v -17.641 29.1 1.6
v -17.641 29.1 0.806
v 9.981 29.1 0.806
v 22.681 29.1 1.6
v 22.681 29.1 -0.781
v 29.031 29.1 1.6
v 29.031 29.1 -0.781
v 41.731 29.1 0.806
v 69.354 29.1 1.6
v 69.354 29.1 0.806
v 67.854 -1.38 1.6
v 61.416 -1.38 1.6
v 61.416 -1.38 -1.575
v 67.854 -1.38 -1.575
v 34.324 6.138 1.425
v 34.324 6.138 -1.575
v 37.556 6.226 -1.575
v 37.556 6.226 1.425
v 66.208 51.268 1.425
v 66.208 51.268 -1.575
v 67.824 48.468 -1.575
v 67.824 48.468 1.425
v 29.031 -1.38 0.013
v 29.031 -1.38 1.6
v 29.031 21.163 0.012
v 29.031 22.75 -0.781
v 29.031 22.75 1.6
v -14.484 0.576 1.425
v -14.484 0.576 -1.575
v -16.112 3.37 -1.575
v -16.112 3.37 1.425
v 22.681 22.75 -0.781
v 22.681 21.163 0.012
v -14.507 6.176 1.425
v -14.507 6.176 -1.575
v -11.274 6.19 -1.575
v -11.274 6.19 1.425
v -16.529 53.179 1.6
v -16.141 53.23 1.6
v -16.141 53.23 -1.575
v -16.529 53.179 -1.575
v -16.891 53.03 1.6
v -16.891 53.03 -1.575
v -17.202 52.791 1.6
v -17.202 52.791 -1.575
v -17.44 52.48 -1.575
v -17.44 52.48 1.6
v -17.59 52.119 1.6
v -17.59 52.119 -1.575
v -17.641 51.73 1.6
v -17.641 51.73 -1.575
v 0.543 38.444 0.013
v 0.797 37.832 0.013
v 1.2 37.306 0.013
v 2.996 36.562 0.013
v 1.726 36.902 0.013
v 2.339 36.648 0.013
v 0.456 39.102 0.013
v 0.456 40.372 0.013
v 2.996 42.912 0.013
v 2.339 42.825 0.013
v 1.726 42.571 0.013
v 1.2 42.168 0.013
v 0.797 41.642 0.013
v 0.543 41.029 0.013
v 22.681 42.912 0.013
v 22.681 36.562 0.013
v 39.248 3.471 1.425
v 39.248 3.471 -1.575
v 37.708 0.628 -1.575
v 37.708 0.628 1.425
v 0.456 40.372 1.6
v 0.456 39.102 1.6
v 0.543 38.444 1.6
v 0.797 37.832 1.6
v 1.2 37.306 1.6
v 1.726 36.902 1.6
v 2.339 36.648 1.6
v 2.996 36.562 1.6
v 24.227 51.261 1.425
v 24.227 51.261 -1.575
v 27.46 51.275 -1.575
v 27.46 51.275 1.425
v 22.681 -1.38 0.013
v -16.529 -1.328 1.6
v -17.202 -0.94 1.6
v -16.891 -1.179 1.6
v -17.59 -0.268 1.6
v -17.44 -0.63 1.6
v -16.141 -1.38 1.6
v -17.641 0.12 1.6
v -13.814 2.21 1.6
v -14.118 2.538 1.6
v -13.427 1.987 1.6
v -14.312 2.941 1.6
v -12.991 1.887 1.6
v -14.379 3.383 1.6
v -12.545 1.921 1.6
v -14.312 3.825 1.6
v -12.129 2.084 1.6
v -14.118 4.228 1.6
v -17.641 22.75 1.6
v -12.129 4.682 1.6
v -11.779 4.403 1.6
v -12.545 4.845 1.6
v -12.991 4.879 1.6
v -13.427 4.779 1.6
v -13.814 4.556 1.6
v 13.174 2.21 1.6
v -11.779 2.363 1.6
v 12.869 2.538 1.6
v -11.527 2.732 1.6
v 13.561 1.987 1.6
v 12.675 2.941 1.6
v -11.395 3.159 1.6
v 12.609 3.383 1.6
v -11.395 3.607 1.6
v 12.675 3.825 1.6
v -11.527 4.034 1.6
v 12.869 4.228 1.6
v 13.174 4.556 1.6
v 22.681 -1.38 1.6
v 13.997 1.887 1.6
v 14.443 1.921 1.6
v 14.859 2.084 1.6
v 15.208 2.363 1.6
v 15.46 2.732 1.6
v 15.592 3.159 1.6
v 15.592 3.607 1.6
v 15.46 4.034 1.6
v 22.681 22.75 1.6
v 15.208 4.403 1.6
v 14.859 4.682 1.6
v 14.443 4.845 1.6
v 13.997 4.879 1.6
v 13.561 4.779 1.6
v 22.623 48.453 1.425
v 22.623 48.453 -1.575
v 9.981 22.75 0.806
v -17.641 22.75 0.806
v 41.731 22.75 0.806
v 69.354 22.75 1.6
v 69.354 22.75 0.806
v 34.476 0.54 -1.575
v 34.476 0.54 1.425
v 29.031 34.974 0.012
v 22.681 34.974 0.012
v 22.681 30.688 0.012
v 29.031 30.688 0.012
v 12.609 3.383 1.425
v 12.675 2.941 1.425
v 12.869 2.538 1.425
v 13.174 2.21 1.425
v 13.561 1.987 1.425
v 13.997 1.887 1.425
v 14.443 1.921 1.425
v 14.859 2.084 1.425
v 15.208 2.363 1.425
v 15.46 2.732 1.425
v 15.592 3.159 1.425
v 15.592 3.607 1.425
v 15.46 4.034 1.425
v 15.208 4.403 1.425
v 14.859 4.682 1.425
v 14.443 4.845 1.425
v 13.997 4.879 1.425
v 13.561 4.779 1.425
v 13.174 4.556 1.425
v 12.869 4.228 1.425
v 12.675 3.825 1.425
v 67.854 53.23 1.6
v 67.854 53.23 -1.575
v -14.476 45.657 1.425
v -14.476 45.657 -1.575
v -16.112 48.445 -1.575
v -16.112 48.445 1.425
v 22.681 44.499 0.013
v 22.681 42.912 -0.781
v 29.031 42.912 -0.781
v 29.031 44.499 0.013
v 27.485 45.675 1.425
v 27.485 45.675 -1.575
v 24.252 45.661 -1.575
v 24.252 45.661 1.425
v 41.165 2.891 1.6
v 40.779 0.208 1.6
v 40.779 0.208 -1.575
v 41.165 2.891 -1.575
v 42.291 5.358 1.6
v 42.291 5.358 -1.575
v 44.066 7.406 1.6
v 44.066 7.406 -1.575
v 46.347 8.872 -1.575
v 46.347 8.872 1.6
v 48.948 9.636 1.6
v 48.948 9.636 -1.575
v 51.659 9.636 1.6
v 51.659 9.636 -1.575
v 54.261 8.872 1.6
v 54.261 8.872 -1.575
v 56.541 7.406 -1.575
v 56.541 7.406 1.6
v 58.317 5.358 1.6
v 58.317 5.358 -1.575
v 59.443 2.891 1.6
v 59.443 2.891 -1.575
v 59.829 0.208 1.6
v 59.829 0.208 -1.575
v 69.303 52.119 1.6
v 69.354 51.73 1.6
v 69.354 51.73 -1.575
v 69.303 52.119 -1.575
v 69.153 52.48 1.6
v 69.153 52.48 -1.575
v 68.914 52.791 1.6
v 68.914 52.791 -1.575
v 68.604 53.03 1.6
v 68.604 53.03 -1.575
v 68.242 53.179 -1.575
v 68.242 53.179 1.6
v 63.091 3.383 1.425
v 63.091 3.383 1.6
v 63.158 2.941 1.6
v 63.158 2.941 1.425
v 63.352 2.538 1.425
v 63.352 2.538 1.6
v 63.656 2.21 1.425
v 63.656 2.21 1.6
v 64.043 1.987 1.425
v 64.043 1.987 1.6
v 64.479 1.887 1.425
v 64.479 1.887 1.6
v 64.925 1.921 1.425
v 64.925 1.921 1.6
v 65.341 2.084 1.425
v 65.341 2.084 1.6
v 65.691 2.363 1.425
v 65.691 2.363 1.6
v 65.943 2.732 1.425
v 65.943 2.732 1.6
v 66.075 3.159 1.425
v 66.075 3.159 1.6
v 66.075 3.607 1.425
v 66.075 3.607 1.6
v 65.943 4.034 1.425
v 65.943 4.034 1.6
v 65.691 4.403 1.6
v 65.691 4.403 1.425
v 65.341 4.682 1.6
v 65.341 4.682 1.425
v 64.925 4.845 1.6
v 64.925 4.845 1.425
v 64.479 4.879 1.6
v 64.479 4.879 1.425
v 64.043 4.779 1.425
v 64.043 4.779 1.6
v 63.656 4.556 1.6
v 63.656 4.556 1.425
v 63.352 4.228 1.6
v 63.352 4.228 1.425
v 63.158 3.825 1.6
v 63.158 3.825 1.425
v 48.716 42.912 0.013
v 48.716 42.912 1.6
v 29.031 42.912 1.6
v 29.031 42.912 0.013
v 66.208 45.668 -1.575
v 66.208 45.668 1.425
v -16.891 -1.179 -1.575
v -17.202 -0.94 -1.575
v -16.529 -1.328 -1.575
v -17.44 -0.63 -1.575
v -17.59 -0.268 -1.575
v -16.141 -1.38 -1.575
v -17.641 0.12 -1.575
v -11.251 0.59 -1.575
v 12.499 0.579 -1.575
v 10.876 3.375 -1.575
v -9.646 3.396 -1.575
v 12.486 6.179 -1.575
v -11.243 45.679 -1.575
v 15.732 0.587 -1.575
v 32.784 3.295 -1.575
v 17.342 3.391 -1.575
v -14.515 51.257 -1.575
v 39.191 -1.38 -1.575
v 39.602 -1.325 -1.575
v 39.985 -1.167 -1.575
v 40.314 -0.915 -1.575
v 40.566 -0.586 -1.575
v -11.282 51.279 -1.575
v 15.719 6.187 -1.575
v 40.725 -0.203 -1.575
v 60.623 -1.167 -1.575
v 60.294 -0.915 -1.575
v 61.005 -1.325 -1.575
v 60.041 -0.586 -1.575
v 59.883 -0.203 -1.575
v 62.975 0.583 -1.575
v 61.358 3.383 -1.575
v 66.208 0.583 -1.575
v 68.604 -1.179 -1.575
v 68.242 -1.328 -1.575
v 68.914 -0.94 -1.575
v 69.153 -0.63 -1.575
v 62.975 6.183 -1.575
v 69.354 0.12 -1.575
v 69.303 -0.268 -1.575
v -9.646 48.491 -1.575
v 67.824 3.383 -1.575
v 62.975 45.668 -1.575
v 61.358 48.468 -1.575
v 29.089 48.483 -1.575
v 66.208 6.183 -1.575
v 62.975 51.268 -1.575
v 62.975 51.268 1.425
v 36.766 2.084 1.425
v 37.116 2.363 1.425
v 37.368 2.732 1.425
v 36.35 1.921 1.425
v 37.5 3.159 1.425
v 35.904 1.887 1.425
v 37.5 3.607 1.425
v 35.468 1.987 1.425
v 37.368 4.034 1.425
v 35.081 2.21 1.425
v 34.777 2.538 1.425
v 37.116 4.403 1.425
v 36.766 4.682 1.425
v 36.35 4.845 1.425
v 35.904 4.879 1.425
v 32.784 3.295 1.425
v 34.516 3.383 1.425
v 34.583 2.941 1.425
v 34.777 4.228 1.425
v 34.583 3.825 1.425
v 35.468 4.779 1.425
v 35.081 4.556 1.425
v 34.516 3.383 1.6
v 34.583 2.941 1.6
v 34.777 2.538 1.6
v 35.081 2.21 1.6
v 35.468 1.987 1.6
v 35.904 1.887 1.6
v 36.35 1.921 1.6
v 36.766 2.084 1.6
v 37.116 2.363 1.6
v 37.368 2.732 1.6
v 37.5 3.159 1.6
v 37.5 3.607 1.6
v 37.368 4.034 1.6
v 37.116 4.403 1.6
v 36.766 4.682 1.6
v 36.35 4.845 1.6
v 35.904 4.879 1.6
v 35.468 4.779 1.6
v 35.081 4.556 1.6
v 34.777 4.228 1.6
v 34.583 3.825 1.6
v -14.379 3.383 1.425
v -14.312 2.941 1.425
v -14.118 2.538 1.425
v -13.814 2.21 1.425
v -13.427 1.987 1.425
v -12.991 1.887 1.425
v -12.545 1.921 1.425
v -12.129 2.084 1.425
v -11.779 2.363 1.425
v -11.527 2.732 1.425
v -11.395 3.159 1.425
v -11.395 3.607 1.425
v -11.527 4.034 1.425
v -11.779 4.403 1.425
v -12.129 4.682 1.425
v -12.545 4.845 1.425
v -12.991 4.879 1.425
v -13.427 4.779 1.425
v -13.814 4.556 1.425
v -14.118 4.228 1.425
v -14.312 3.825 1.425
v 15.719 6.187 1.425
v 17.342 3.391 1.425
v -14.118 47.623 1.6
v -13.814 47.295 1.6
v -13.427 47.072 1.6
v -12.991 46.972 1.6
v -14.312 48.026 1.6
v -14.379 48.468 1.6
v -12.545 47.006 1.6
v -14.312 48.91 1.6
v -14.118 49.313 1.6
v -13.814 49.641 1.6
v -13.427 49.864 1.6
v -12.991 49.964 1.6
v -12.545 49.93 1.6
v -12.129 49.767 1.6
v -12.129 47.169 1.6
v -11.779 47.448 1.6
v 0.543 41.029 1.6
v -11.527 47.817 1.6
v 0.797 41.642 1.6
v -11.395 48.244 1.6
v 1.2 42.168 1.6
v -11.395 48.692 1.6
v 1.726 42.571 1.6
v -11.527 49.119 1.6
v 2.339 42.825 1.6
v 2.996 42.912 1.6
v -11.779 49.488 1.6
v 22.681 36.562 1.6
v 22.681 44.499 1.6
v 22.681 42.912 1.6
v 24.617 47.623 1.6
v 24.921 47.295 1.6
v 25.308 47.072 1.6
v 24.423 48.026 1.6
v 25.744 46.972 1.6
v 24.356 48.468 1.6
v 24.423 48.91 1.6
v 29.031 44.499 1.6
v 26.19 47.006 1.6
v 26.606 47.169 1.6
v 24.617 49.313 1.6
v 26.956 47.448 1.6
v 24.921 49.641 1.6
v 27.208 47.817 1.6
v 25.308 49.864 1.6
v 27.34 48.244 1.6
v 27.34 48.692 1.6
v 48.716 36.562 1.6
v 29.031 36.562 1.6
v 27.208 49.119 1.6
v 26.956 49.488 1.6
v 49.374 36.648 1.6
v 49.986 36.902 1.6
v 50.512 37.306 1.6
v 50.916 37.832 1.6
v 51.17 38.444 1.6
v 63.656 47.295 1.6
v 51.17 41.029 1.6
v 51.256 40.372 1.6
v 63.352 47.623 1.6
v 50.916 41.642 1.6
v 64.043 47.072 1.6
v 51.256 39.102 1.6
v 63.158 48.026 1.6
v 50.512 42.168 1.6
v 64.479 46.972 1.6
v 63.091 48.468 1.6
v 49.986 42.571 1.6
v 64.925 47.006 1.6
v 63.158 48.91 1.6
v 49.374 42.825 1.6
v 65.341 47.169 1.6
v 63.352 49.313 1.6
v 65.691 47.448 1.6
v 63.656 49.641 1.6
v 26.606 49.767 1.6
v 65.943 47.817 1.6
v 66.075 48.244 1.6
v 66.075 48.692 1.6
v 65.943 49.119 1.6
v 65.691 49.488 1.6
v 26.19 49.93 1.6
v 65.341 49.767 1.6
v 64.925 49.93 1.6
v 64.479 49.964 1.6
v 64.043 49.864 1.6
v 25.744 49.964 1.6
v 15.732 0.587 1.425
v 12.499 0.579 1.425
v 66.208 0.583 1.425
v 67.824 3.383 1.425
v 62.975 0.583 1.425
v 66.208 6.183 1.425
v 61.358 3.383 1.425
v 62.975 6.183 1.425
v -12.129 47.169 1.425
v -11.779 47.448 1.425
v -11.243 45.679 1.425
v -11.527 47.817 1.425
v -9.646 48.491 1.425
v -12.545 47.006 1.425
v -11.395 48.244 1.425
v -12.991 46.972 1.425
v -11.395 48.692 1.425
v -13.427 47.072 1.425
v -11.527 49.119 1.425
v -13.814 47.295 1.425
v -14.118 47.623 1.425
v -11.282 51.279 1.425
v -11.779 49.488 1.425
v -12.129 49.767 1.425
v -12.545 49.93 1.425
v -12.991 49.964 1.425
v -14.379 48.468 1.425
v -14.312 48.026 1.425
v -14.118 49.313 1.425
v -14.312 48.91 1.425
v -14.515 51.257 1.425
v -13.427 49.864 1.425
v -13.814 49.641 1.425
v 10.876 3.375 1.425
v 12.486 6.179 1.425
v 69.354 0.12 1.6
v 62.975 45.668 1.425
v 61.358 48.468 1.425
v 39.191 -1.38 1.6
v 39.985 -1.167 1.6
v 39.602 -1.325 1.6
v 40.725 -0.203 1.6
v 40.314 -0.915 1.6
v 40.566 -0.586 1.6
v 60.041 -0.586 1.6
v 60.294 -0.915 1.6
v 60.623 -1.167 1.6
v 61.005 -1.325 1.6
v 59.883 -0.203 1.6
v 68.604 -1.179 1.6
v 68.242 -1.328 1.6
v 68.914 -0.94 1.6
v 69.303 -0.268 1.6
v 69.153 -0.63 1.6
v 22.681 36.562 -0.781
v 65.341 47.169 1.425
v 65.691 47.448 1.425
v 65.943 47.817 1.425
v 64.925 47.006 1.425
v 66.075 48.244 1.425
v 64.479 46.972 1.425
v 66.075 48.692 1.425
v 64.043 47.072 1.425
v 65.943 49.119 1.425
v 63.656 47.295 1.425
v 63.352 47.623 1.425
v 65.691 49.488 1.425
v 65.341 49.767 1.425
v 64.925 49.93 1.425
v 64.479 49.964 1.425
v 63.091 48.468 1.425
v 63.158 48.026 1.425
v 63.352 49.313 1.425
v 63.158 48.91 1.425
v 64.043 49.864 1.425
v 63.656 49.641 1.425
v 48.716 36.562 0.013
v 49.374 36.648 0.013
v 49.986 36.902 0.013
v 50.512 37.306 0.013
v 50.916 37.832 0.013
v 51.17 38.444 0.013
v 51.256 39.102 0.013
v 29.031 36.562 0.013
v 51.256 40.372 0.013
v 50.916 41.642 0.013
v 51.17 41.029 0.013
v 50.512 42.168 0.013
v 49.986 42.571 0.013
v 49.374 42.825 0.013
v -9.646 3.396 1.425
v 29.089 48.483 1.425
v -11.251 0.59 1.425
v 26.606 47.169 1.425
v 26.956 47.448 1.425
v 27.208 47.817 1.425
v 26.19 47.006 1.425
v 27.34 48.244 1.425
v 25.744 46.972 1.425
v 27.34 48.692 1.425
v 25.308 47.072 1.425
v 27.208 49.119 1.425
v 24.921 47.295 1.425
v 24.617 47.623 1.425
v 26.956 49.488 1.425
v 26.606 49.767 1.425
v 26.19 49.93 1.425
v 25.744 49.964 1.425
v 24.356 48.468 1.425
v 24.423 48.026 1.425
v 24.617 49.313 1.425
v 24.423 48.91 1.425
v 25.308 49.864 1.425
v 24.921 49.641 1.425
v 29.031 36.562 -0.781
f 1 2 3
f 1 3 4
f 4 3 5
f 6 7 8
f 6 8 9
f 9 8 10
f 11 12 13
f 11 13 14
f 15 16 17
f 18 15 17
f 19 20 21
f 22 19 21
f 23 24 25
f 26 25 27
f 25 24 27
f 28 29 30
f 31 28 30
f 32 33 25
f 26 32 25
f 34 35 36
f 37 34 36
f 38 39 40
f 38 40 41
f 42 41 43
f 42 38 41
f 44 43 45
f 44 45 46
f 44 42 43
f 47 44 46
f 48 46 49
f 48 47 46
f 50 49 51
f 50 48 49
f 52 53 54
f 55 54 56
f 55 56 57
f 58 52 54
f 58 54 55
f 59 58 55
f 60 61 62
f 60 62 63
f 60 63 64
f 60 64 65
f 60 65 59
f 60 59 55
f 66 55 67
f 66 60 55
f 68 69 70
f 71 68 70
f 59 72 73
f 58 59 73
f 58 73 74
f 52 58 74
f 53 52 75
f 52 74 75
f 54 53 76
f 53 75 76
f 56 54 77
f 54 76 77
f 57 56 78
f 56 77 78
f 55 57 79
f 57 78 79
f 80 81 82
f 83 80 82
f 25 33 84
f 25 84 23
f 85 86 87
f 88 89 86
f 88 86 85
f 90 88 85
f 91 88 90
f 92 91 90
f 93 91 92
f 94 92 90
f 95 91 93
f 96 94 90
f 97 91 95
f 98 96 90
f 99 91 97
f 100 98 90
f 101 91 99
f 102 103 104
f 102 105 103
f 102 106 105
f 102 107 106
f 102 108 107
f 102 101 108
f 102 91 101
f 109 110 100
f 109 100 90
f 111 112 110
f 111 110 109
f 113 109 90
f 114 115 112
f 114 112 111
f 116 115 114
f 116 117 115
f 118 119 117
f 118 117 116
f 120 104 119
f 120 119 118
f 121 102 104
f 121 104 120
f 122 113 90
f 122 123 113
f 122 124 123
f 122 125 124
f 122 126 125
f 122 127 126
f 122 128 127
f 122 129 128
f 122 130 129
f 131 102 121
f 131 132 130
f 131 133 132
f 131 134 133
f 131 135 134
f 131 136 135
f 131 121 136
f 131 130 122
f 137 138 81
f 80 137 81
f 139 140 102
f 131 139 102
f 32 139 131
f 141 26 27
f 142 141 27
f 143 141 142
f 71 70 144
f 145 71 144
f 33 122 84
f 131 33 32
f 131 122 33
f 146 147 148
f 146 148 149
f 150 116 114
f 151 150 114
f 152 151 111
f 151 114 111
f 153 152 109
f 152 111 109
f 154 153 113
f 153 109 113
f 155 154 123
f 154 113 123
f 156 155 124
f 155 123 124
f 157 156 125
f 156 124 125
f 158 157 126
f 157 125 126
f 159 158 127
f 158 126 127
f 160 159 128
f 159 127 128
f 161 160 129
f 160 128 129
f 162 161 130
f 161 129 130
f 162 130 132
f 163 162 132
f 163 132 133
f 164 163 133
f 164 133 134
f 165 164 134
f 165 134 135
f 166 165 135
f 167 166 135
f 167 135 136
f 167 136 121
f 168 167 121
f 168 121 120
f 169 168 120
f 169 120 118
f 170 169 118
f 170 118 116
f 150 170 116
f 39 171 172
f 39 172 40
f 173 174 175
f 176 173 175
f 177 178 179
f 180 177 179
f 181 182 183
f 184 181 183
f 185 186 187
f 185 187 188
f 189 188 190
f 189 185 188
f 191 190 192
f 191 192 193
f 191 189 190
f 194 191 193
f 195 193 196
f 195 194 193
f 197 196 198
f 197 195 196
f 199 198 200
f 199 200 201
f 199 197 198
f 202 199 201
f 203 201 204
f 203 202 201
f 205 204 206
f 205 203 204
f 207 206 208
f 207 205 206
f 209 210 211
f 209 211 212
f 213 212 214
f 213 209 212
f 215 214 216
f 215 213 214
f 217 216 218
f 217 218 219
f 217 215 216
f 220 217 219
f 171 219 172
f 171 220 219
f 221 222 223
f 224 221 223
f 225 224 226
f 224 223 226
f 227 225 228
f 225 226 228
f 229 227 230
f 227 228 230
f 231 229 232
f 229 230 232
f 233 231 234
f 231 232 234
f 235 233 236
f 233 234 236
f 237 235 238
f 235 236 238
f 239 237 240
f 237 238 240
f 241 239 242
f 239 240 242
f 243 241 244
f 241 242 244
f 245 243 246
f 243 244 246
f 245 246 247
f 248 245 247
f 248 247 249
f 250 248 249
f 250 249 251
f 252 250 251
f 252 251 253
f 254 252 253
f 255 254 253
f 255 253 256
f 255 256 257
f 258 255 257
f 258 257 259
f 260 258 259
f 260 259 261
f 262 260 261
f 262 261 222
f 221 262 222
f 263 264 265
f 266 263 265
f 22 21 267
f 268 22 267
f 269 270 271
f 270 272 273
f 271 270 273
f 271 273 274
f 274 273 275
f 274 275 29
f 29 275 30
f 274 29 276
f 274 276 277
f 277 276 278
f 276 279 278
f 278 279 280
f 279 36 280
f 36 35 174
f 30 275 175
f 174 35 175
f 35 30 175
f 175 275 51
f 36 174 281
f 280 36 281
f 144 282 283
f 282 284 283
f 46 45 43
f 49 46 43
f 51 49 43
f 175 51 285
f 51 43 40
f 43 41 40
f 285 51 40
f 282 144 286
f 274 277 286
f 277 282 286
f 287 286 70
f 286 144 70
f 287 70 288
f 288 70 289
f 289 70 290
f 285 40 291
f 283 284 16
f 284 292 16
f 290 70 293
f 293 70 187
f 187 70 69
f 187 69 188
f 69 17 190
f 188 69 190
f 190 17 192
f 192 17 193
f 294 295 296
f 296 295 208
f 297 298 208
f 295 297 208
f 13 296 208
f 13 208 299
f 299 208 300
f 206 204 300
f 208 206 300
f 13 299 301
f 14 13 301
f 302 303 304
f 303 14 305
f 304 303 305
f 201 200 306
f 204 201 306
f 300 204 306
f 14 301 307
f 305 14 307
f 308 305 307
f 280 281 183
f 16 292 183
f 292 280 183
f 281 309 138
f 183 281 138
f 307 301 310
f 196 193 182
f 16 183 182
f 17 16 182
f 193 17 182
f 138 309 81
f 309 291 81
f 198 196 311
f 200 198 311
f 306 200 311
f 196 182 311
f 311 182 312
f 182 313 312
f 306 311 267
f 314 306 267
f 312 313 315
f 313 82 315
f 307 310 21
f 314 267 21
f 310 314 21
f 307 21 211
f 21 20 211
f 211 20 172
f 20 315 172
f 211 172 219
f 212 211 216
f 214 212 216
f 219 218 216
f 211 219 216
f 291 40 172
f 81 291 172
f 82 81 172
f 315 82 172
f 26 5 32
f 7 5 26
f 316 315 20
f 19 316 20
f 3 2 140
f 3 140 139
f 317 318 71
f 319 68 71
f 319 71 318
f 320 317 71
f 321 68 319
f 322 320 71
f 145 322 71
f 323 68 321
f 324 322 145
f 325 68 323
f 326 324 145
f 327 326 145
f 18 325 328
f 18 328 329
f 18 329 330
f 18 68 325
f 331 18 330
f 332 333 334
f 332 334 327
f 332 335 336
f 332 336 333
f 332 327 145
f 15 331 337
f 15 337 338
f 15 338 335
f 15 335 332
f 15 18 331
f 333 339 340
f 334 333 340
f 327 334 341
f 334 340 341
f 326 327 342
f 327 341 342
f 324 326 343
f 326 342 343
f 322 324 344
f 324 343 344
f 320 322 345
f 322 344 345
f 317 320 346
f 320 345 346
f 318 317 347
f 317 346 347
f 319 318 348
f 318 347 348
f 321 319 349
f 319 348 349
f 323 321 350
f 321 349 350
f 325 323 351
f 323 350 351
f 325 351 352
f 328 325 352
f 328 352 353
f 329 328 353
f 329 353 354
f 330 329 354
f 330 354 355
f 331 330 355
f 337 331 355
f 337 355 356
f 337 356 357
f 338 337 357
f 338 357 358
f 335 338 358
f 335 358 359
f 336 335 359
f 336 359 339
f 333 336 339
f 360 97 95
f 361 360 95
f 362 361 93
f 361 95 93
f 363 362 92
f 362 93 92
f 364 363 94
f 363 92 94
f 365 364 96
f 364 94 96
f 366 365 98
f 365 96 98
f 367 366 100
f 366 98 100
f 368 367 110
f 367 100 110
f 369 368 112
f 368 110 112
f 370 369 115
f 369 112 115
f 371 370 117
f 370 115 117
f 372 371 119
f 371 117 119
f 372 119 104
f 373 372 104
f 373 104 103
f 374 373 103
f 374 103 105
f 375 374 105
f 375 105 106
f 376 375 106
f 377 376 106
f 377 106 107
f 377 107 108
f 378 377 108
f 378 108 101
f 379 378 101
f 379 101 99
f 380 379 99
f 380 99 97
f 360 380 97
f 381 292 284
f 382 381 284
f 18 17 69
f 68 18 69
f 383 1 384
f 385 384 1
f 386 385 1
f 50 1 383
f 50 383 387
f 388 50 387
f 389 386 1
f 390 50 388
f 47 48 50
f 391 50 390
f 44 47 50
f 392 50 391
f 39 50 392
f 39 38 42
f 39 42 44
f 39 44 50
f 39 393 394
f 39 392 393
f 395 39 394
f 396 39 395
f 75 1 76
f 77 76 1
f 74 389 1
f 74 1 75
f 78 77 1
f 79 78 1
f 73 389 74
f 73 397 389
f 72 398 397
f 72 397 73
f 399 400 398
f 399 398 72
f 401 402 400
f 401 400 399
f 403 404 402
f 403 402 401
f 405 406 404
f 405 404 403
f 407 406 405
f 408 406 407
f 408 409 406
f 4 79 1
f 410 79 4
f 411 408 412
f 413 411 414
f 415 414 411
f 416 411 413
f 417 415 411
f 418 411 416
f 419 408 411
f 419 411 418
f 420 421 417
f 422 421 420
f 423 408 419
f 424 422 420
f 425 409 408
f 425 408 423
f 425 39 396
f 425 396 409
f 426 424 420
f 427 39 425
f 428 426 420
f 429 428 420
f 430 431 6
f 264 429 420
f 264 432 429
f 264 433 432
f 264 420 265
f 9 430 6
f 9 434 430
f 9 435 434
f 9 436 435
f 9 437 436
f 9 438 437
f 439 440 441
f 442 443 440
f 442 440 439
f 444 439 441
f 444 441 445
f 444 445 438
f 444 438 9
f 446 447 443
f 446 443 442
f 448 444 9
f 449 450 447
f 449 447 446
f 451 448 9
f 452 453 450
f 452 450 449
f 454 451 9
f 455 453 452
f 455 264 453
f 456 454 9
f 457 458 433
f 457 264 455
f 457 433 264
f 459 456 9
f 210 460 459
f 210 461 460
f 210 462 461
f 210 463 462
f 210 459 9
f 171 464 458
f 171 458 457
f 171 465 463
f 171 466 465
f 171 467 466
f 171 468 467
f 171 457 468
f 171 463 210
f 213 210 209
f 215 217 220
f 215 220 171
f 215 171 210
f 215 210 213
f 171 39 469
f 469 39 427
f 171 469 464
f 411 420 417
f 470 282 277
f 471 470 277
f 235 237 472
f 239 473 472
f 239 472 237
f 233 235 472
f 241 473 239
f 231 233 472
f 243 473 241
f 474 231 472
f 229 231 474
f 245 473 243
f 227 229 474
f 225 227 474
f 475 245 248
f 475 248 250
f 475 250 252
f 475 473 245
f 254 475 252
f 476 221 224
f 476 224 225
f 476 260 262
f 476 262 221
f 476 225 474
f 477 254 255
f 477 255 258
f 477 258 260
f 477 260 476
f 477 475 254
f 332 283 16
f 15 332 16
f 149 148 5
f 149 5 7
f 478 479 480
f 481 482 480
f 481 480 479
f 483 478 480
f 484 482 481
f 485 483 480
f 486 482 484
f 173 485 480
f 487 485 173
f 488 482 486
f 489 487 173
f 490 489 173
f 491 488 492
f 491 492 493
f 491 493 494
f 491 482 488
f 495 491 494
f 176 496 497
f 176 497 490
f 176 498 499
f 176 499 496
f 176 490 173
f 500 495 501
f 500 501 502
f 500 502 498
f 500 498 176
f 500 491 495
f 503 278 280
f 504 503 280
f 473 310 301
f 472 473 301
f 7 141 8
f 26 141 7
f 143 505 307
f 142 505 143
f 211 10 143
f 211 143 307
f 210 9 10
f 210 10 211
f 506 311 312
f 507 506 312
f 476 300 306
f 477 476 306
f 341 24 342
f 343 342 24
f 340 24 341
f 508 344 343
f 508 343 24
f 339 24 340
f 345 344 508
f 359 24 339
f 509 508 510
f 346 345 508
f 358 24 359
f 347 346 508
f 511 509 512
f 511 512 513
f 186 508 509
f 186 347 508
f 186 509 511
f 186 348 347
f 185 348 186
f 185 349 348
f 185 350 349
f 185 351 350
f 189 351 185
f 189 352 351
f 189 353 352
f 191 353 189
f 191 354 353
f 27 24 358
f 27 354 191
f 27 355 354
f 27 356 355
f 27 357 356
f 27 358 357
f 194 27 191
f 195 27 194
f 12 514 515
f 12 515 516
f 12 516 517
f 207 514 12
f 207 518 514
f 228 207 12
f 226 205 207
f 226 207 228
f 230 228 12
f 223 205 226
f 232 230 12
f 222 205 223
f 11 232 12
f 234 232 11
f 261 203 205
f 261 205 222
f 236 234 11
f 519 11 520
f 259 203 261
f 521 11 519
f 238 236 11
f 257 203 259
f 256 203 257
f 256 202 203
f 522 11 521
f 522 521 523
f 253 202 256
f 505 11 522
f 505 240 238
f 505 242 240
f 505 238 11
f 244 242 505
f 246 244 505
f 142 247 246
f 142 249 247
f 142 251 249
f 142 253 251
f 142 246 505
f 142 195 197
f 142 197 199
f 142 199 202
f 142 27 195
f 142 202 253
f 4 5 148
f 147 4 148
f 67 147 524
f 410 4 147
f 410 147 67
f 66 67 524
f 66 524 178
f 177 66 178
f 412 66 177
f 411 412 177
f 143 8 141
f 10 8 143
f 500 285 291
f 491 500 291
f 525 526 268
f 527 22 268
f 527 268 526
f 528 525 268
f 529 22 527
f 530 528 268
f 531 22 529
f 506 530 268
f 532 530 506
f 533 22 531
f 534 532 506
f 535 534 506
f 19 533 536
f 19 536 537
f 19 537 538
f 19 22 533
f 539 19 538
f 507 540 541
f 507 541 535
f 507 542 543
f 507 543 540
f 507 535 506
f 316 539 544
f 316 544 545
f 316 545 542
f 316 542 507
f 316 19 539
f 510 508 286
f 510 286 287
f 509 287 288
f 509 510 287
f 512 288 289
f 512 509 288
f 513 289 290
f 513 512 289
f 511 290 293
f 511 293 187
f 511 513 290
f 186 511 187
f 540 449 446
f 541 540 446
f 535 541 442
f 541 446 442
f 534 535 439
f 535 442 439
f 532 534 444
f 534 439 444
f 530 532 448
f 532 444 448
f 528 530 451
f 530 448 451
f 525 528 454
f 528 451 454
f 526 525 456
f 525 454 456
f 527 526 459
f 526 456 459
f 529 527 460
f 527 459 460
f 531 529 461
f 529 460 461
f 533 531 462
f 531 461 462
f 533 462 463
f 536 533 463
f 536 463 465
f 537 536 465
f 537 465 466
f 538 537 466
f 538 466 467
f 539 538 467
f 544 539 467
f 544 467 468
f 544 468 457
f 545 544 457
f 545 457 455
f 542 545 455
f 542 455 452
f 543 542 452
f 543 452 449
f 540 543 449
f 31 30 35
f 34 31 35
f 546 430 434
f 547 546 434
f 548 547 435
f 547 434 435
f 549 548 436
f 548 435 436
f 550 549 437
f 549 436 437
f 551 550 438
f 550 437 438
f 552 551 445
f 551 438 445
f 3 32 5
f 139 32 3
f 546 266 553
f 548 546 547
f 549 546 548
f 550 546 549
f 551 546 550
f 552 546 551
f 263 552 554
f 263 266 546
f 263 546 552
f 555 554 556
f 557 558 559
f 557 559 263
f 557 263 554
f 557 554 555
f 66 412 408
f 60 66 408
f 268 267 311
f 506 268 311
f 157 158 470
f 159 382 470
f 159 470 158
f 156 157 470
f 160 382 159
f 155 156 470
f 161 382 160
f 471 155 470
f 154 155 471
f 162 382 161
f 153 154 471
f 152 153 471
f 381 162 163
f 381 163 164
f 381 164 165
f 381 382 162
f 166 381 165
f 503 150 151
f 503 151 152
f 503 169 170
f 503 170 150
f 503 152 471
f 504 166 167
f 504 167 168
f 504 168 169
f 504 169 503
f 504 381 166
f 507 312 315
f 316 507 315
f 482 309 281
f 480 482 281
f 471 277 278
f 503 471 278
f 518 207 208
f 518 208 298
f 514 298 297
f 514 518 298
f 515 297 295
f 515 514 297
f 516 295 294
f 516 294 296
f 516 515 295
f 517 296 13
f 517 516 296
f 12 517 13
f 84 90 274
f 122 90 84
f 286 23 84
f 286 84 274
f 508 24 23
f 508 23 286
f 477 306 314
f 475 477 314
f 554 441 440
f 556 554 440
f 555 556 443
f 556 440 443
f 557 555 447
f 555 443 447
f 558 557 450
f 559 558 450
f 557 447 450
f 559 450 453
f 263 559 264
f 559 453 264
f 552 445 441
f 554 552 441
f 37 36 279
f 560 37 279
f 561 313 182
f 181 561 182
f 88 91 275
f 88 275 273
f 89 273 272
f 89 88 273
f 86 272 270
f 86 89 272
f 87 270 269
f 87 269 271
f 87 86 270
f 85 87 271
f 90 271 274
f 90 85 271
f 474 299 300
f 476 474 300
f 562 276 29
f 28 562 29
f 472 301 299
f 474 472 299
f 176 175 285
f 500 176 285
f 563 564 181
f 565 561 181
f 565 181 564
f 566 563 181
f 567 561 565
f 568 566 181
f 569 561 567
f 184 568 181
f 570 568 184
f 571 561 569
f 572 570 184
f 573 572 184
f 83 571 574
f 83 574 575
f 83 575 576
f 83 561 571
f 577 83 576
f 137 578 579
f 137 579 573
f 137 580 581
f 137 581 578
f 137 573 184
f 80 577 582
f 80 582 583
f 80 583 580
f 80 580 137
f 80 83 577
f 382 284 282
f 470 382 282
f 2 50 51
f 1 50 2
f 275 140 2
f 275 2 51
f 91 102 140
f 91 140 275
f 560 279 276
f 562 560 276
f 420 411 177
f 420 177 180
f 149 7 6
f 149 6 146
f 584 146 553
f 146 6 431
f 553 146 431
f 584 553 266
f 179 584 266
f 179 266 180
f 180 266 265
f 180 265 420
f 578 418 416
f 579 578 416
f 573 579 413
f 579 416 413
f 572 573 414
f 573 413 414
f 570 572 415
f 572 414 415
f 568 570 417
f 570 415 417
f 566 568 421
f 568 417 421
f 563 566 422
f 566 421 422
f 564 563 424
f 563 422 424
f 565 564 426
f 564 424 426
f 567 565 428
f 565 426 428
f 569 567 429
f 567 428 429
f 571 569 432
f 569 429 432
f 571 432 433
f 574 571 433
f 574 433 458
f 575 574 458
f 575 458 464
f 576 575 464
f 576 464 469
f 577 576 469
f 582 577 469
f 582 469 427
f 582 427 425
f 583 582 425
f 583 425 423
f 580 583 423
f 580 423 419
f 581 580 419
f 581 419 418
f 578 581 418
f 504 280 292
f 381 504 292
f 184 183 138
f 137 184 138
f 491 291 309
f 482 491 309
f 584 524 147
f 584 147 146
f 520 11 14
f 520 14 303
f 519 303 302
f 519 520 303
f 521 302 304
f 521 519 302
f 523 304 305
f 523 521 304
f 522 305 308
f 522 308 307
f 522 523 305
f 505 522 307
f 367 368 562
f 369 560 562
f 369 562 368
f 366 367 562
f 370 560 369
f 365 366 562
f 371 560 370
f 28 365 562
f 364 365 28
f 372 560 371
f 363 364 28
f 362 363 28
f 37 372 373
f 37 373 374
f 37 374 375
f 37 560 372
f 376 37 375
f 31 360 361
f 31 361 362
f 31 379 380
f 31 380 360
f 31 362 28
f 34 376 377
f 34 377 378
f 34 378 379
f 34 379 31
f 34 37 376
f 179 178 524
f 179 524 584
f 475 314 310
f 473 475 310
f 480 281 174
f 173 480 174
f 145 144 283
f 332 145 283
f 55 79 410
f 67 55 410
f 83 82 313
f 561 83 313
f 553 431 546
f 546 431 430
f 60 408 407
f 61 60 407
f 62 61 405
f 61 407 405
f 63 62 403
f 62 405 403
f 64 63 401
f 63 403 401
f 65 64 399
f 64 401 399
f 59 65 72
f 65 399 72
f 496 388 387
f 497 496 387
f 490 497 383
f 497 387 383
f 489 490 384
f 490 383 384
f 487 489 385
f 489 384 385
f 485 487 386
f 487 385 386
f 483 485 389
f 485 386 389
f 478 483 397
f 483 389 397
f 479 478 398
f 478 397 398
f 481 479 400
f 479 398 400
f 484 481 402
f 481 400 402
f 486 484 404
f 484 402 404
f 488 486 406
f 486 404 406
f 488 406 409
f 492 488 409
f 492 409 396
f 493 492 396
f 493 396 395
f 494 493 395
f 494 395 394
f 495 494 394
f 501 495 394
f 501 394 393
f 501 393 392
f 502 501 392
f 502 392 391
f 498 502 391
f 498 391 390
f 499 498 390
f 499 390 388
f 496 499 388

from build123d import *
from OCP.BRepFilletAPI import BRepFilletAPI_MakeChamfer

# Parameters (mm, degrees)
SKETCH1_R           = 1.5
BOSS_EXTRUDE1_DEPTH = 3.175
SKETCH2_W           = 86.995
SKETCH2_H           = 6.35
CUT_EXTRUDE1_DEPTH  = 0.79375
SKETCH3_W           = 6.35
SKETCH3_H           = 30.48
CUT_EXTRUDE2_DEPTH  = 1.5875
SKETCH4_W           = 6.35
SKETCH4_H           = 15.39875
CUT_EXTRUDE3_DEPTH  = 1.5875
SKETCH6_W           = 6.35
SKETCH6_H           = 6.35
CUT_EXTRUDE4_DEPTH  = 0.79375
CHAMFER2_SIZE       = 1.5875
CHAMFER2_SIZE_2     = 0.79375
CUT_EXTRUDE5_DEPTH  = 1.5875
CUT_EXTRUDE6_DEPTH  = 3
SKETCH11_W          = 6.35
SKETCH11_H          = 6.35
CUT_EXTRUDE8_DEPTH  = 0.79375
CHAMFER3_START      = 22.750484618
CHAMFER3_DEPTH      = 6.35
CHAMFER4_SIZE       = 0.79375
CHAMFER4_SIZE_2     = 1.5875


with BuildPart() as part:
    # Sketch1 → Boss-Extrude1 (new body)
    with BuildSketch(Plane.XY.offset(1.6)):
        with BuildLine():
            Line((-17.641226071, 51.730484618), (-17.641226071, 0.120484618))
            ThreePointArc((-17.641226071, 0.120484618), (-17.201886242, -0.940175553), (-16.141226071, -1.379515382))
            Line((-16.141226071, -1.379515382), (39.191273929, -1.379515382))
            ThreePointArc((39.191273929, -1.379515382), (40.313805944, -0.914547397), (40.778773929, 0.207984618))
            ThreePointArc((40.778773929, 0.207984618), (50.303773929, 9.732984618), (59.828773929, 0.207984618))
            ThreePointArc((59.828773929, 0.207984618), (60.293741914, -0.914547397), (61.416273929, -1.379515382))
            Line((61.416273929, -1.379515382), (67.853773929, -1.379515382))
            ThreePointArc((67.853773929, -1.379515382), (68.914434101, -0.940175553), (69.353773929, 0.120484618))
            Line((69.353773929, 0.120484618), (69.353773929, 51.730484618))
            ThreePointArc((69.353773929, 51.730484618), (68.914434101, 52.79114479), (67.853773929, 53.230484618))
            Line((67.853773929, 53.230484618), (-16.141226071, 53.230484618))
            ThreePointArc((-16.141226071, 53.230484618), (-17.201886242, 52.79114479), (-17.641226071, 51.730484618))
        make_face()
        with Locations(Location((-12.878726071, 48.467984618, 0), (0, 0, 180))):
            Circle(SKETCH1_R, mode=Mode.SUBTRACT)
        with Locations(Location((-12.878726071, 3.382984618, 0), (0, 0, 180))):
            Circle(SKETCH1_R, mode=Mode.SUBTRACT)
        with Locations(Location((64.591273929, 3.382984618, 0), (0, 0, 180))):
            Circle(SKETCH1_R, mode=Mode.SUBTRACT)
        with Locations(Location((64.591273929, 48.467984618, 0), (0, 0, 180))):
            Circle(SKETCH1_R, mode=Mode.SUBTRACT)
        with Locations(Location((14.108773929, 3.382984618, 0), (0, 0, 180))):
            Circle(SKETCH1_R, mode=Mode.SUBTRACT)
        with Locations(Location((36.016273929, 3.382984618, 0), (0, 0, 180))):
            Circle(SKETCH1_R, mode=Mode.SUBTRACT)
        with Locations(Location((25.856273929, 48.467984618, 0), (0, 0, 180))):
            Circle(SKETCH1_R, mode=Mode.SUBTRACT)
    extrude(amount=-BOSS_EXTRUDE1_DEPTH)

    # Sketch2 → Cut-Extrude1 (cut)
    with BuildSketch(Plane.XY.offset(1.6)):
        with Locations((25.856273929, 25.925484618)):
            Rectangle(SKETCH2_W, SKETCH2_H)
    extrude(amount=-CUT_EXTRUDE1_DEPTH, mode=Mode.SUBTRACT)

    # Sketch3 → Cut-Extrude2 (cut)
    with BuildSketch(Plane.XY.offset(1.6)):
        with Locations((25.856273929, 13.860484618)):
            Rectangle(SKETCH3_W, SKETCH3_H)
    extrude(amount=-CUT_EXTRUDE2_DEPTH, mode=Mode.SUBTRACT)

    # Sketch4 → Cut-Extrude3 (cut)
    with BuildSketch(Plane.XY.offset(1.6)):
        with Locations((25.856273929, 36.799859618)):
            Rectangle(SKETCH4_W, SKETCH4_H)
    extrude(amount=-CUT_EXTRUDE3_DEPTH, mode=Mode.SUBTRACT)

    # Sketch6 → Cut-Extrude4 (cut)
    with BuildSketch(Plane.XY.offset(0.0125)):
        with Locations((25.856273929, 39.736734618)):
            Rectangle(SKETCH6_W, SKETCH6_H)
    extrude(amount=-CUT_EXTRUDE4_DEPTH, mode=Mode.SUBTRACT)

    # Chamfer2
    chamfer2_edges_1 = [part.edges().sort_by_distance(p)[0] for p in [
        (25.856273929, 36.561734618, 0.0125),
    ]]
    chamfer2_side_1 = [part.faces().sort_by_distance(p)[0] for p in [
        (25.856273929, 36.545859618, 0.0125),
    ]]
    chamfer2_edges_2 = [part.edges().sort_by_distance(p)[0] for p in [
        (25.856273929, 42.911734618, 0.0125),
    ]]
    chamfer2_side_2 = [part.faces().sort_by_distance(p)[0] for p in [
        (25.856273929, 42.927609618, 0.0125),
    ]]
    chamfer2 = BRepFilletAPI_MakeChamfer(part.part.solid().wrapped)
    for e in chamfer2_edges_1:
        chamfer2.Add(CHAMFER2_SIZE - 0.0001, CHAMFER2_SIZE_2 - 0.0001, e.wrapped, chamfer2_side_1[0].wrapped)
    for e in chamfer2_edges_2:
        chamfer2.Add(CHAMFER2_SIZE - 0.0001, CHAMFER2_SIZE_2 - 0.0001, e.wrapped, chamfer2_side_2[0].wrapped)
    add(Compound.cast(chamfer2.Shape()), mode=Mode.REPLACE)  # a hair under: the kernel refuses the full size

    # Sketch7 → Cut-Extrude5 (cut)
    with BuildSketch(Plane.XY.offset(1.6)):
        with BuildLine():
            Line((48.716273929, 42.911734618), (2.996273929, 42.911734618))
            ThreePointArc((2.996273929, 42.911734618), (1.200222705, 42.167785843), (0.456273929, 40.371734618))
            Line((0.456273929, 40.371734618), (0.456273929, 39.101734618))
            ThreePointArc((0.456273929, 39.101734618), (1.200222705, 37.305683394), (2.996273929, 36.561734618))
            Line((2.996273929, 36.561734618), (48.716273929, 36.561734618))
            ThreePointArc((48.716273929, 36.561734618), (50.512325153, 37.305683394), (51.256273929, 39.101734618))
            Line((51.256273929, 39.101734618), (51.256273929, 40.371734618))
            ThreePointArc((51.256273929, 40.371734618), (50.512325153, 42.167785843), (48.716273929, 42.911734618))
        make_face()
    extrude(amount=-CUT_EXTRUDE5_DEPTH, mode=Mode.SUBTRACT)

    # Sketch9 → Cut-Extrude6 (cut)
    with BuildSketch(Plane(origin=(0, 0, -1.575), x_dir=(-1, 0, 0), z_dir=(0, 0, -1))):
        Polygon((-22.623145199, 48.453426307), (-24.227101696, 51.260677077), (-27.460230427, 51.275235389), (-29.08940266, 48.48254293), (-27.485446162, 45.67529216), (-24.252317432, 45.660733848), align=None)
        Polygon((-10.875621178, 3.375460135), (-12.48568116, 6.179214794), (-15.718833912, 6.186739277), (-17.341926681, 3.390509102), (-15.731866699, 0.586754443), (-12.498713947, 0.57922996), align=None)
        Polygon((16.111859882, 3.369602212), (14.50688248, 6.17626943), (11.273748669, 6.189651836), (9.645592259, 3.396367025), (11.250569661, 0.589699807), (14.483703473, 0.576317401), align=None)
        Polygon((16.1118088, 48.445414775), (14.514813493, 51.256631473), (11.281730764, 51.279201317), (9.645643341, 48.490554462), (11.242638648, 45.679337764), (14.475721377, 45.65676792), align=None)
        Polygon((-61.358112429, 48.468201712), (-62.974881187, 51.268093159), (-66.208042688, 51.267876066), (-67.824435429, 48.467767525), (-66.207666671, 45.667876078), (-62.974505171, 45.668093171), align=None)
        Polygon((-61.358112422, 3.382984618), (-62.974693176, 6.182984618), (-66.207854683, 6.182984618), (-67.824435437, 3.382984618), (-66.207854683, 0.582984618), (-62.974693176, 0.582984618), align=None)
        Polygon((-32.784301689, 3.295298985), (-34.324349823, 6.138111866), (-37.556322063, 6.2257975), (-39.24824617, 3.470670252), (-37.708198036, 0.627857371), (-34.476225796, 0.540171737), align=None)
    extrude(amount=-CUT_EXTRUDE6_DEPTH, mode=Mode.SUBTRACT)

    # Sketch11 → Cut-Extrude8 (cut)
    with BuildSketch(Plane.XY.offset(0.0125)):
        with Locations((25.856273929, 25.925484618)):
            Rectangle(SKETCH11_W, SKETCH11_H)
    extrude(amount=-CUT_EXTRUDE8_DEPTH, mode=Mode.SUBTRACT)

    # Chamfer3: read off the stored shape, not the designer's step
    # Chamfer3 outline → Chamfer3 (cut)
    with BuildSketch(Plane(origin=(0, 0, 0), x_dir=(1, 0, 0), z_dir=(0, 1, 0)).offset(CHAMFER3_START)):
        Polygon((22.681273929, 0.78125), (9.981273929, -0.80625), (22.681273929, -0.80625), align=None)
        Polygon((41.731273929, -0.80625), (29.031273929, 0.78125), (29.031273929, -0.80625), align=None)
    extrude(amount=CHAMFER3_DEPTH, mode=Mode.SUBTRACT)

    # Chamfer4
    chamfer4_edges_1 = [part.edges().sort_by_distance(p)[0] for p in [
        (25.856273929, 22.750484618, 0.0125),
    ]]
    chamfer4_side_1 = [part.faces().sort_by_distance(p)[0] for p in [
        (25.856273929, 22.750484618, -0.003375),
    ]]
    chamfer4_edges_2 = [part.edges().sort_by_distance(p)[0] for p in [
        (25.856273929, 29.100484618, 0.0125),
    ]]
    chamfer4_side_2 = [part.faces().sort_by_distance(p)[0] for p in [
        (25.856273929, 29.100484618, -0.003375),
    ]]
    chamfer4 = BRepFilletAPI_MakeChamfer(part.part.solid().wrapped)
    for e in chamfer4_edges_1:
        chamfer4.Add(CHAMFER4_SIZE - 0.0001, CHAMFER4_SIZE_2 - 0.0001, e.wrapped, chamfer4_side_1[0].wrapped)
    for e in chamfer4_edges_2:
        chamfer4.Add(CHAMFER4_SIZE - 0.0001, CHAMFER4_SIZE_2 - 0.0001, e.wrapped, chamfer4_side_2[0].wrapped)
    add(Compound.cast(chamfer4.Shape()), mode=Mode.REPLACE)  # a hair under: the kernel refuses the full size


solid = part.part
